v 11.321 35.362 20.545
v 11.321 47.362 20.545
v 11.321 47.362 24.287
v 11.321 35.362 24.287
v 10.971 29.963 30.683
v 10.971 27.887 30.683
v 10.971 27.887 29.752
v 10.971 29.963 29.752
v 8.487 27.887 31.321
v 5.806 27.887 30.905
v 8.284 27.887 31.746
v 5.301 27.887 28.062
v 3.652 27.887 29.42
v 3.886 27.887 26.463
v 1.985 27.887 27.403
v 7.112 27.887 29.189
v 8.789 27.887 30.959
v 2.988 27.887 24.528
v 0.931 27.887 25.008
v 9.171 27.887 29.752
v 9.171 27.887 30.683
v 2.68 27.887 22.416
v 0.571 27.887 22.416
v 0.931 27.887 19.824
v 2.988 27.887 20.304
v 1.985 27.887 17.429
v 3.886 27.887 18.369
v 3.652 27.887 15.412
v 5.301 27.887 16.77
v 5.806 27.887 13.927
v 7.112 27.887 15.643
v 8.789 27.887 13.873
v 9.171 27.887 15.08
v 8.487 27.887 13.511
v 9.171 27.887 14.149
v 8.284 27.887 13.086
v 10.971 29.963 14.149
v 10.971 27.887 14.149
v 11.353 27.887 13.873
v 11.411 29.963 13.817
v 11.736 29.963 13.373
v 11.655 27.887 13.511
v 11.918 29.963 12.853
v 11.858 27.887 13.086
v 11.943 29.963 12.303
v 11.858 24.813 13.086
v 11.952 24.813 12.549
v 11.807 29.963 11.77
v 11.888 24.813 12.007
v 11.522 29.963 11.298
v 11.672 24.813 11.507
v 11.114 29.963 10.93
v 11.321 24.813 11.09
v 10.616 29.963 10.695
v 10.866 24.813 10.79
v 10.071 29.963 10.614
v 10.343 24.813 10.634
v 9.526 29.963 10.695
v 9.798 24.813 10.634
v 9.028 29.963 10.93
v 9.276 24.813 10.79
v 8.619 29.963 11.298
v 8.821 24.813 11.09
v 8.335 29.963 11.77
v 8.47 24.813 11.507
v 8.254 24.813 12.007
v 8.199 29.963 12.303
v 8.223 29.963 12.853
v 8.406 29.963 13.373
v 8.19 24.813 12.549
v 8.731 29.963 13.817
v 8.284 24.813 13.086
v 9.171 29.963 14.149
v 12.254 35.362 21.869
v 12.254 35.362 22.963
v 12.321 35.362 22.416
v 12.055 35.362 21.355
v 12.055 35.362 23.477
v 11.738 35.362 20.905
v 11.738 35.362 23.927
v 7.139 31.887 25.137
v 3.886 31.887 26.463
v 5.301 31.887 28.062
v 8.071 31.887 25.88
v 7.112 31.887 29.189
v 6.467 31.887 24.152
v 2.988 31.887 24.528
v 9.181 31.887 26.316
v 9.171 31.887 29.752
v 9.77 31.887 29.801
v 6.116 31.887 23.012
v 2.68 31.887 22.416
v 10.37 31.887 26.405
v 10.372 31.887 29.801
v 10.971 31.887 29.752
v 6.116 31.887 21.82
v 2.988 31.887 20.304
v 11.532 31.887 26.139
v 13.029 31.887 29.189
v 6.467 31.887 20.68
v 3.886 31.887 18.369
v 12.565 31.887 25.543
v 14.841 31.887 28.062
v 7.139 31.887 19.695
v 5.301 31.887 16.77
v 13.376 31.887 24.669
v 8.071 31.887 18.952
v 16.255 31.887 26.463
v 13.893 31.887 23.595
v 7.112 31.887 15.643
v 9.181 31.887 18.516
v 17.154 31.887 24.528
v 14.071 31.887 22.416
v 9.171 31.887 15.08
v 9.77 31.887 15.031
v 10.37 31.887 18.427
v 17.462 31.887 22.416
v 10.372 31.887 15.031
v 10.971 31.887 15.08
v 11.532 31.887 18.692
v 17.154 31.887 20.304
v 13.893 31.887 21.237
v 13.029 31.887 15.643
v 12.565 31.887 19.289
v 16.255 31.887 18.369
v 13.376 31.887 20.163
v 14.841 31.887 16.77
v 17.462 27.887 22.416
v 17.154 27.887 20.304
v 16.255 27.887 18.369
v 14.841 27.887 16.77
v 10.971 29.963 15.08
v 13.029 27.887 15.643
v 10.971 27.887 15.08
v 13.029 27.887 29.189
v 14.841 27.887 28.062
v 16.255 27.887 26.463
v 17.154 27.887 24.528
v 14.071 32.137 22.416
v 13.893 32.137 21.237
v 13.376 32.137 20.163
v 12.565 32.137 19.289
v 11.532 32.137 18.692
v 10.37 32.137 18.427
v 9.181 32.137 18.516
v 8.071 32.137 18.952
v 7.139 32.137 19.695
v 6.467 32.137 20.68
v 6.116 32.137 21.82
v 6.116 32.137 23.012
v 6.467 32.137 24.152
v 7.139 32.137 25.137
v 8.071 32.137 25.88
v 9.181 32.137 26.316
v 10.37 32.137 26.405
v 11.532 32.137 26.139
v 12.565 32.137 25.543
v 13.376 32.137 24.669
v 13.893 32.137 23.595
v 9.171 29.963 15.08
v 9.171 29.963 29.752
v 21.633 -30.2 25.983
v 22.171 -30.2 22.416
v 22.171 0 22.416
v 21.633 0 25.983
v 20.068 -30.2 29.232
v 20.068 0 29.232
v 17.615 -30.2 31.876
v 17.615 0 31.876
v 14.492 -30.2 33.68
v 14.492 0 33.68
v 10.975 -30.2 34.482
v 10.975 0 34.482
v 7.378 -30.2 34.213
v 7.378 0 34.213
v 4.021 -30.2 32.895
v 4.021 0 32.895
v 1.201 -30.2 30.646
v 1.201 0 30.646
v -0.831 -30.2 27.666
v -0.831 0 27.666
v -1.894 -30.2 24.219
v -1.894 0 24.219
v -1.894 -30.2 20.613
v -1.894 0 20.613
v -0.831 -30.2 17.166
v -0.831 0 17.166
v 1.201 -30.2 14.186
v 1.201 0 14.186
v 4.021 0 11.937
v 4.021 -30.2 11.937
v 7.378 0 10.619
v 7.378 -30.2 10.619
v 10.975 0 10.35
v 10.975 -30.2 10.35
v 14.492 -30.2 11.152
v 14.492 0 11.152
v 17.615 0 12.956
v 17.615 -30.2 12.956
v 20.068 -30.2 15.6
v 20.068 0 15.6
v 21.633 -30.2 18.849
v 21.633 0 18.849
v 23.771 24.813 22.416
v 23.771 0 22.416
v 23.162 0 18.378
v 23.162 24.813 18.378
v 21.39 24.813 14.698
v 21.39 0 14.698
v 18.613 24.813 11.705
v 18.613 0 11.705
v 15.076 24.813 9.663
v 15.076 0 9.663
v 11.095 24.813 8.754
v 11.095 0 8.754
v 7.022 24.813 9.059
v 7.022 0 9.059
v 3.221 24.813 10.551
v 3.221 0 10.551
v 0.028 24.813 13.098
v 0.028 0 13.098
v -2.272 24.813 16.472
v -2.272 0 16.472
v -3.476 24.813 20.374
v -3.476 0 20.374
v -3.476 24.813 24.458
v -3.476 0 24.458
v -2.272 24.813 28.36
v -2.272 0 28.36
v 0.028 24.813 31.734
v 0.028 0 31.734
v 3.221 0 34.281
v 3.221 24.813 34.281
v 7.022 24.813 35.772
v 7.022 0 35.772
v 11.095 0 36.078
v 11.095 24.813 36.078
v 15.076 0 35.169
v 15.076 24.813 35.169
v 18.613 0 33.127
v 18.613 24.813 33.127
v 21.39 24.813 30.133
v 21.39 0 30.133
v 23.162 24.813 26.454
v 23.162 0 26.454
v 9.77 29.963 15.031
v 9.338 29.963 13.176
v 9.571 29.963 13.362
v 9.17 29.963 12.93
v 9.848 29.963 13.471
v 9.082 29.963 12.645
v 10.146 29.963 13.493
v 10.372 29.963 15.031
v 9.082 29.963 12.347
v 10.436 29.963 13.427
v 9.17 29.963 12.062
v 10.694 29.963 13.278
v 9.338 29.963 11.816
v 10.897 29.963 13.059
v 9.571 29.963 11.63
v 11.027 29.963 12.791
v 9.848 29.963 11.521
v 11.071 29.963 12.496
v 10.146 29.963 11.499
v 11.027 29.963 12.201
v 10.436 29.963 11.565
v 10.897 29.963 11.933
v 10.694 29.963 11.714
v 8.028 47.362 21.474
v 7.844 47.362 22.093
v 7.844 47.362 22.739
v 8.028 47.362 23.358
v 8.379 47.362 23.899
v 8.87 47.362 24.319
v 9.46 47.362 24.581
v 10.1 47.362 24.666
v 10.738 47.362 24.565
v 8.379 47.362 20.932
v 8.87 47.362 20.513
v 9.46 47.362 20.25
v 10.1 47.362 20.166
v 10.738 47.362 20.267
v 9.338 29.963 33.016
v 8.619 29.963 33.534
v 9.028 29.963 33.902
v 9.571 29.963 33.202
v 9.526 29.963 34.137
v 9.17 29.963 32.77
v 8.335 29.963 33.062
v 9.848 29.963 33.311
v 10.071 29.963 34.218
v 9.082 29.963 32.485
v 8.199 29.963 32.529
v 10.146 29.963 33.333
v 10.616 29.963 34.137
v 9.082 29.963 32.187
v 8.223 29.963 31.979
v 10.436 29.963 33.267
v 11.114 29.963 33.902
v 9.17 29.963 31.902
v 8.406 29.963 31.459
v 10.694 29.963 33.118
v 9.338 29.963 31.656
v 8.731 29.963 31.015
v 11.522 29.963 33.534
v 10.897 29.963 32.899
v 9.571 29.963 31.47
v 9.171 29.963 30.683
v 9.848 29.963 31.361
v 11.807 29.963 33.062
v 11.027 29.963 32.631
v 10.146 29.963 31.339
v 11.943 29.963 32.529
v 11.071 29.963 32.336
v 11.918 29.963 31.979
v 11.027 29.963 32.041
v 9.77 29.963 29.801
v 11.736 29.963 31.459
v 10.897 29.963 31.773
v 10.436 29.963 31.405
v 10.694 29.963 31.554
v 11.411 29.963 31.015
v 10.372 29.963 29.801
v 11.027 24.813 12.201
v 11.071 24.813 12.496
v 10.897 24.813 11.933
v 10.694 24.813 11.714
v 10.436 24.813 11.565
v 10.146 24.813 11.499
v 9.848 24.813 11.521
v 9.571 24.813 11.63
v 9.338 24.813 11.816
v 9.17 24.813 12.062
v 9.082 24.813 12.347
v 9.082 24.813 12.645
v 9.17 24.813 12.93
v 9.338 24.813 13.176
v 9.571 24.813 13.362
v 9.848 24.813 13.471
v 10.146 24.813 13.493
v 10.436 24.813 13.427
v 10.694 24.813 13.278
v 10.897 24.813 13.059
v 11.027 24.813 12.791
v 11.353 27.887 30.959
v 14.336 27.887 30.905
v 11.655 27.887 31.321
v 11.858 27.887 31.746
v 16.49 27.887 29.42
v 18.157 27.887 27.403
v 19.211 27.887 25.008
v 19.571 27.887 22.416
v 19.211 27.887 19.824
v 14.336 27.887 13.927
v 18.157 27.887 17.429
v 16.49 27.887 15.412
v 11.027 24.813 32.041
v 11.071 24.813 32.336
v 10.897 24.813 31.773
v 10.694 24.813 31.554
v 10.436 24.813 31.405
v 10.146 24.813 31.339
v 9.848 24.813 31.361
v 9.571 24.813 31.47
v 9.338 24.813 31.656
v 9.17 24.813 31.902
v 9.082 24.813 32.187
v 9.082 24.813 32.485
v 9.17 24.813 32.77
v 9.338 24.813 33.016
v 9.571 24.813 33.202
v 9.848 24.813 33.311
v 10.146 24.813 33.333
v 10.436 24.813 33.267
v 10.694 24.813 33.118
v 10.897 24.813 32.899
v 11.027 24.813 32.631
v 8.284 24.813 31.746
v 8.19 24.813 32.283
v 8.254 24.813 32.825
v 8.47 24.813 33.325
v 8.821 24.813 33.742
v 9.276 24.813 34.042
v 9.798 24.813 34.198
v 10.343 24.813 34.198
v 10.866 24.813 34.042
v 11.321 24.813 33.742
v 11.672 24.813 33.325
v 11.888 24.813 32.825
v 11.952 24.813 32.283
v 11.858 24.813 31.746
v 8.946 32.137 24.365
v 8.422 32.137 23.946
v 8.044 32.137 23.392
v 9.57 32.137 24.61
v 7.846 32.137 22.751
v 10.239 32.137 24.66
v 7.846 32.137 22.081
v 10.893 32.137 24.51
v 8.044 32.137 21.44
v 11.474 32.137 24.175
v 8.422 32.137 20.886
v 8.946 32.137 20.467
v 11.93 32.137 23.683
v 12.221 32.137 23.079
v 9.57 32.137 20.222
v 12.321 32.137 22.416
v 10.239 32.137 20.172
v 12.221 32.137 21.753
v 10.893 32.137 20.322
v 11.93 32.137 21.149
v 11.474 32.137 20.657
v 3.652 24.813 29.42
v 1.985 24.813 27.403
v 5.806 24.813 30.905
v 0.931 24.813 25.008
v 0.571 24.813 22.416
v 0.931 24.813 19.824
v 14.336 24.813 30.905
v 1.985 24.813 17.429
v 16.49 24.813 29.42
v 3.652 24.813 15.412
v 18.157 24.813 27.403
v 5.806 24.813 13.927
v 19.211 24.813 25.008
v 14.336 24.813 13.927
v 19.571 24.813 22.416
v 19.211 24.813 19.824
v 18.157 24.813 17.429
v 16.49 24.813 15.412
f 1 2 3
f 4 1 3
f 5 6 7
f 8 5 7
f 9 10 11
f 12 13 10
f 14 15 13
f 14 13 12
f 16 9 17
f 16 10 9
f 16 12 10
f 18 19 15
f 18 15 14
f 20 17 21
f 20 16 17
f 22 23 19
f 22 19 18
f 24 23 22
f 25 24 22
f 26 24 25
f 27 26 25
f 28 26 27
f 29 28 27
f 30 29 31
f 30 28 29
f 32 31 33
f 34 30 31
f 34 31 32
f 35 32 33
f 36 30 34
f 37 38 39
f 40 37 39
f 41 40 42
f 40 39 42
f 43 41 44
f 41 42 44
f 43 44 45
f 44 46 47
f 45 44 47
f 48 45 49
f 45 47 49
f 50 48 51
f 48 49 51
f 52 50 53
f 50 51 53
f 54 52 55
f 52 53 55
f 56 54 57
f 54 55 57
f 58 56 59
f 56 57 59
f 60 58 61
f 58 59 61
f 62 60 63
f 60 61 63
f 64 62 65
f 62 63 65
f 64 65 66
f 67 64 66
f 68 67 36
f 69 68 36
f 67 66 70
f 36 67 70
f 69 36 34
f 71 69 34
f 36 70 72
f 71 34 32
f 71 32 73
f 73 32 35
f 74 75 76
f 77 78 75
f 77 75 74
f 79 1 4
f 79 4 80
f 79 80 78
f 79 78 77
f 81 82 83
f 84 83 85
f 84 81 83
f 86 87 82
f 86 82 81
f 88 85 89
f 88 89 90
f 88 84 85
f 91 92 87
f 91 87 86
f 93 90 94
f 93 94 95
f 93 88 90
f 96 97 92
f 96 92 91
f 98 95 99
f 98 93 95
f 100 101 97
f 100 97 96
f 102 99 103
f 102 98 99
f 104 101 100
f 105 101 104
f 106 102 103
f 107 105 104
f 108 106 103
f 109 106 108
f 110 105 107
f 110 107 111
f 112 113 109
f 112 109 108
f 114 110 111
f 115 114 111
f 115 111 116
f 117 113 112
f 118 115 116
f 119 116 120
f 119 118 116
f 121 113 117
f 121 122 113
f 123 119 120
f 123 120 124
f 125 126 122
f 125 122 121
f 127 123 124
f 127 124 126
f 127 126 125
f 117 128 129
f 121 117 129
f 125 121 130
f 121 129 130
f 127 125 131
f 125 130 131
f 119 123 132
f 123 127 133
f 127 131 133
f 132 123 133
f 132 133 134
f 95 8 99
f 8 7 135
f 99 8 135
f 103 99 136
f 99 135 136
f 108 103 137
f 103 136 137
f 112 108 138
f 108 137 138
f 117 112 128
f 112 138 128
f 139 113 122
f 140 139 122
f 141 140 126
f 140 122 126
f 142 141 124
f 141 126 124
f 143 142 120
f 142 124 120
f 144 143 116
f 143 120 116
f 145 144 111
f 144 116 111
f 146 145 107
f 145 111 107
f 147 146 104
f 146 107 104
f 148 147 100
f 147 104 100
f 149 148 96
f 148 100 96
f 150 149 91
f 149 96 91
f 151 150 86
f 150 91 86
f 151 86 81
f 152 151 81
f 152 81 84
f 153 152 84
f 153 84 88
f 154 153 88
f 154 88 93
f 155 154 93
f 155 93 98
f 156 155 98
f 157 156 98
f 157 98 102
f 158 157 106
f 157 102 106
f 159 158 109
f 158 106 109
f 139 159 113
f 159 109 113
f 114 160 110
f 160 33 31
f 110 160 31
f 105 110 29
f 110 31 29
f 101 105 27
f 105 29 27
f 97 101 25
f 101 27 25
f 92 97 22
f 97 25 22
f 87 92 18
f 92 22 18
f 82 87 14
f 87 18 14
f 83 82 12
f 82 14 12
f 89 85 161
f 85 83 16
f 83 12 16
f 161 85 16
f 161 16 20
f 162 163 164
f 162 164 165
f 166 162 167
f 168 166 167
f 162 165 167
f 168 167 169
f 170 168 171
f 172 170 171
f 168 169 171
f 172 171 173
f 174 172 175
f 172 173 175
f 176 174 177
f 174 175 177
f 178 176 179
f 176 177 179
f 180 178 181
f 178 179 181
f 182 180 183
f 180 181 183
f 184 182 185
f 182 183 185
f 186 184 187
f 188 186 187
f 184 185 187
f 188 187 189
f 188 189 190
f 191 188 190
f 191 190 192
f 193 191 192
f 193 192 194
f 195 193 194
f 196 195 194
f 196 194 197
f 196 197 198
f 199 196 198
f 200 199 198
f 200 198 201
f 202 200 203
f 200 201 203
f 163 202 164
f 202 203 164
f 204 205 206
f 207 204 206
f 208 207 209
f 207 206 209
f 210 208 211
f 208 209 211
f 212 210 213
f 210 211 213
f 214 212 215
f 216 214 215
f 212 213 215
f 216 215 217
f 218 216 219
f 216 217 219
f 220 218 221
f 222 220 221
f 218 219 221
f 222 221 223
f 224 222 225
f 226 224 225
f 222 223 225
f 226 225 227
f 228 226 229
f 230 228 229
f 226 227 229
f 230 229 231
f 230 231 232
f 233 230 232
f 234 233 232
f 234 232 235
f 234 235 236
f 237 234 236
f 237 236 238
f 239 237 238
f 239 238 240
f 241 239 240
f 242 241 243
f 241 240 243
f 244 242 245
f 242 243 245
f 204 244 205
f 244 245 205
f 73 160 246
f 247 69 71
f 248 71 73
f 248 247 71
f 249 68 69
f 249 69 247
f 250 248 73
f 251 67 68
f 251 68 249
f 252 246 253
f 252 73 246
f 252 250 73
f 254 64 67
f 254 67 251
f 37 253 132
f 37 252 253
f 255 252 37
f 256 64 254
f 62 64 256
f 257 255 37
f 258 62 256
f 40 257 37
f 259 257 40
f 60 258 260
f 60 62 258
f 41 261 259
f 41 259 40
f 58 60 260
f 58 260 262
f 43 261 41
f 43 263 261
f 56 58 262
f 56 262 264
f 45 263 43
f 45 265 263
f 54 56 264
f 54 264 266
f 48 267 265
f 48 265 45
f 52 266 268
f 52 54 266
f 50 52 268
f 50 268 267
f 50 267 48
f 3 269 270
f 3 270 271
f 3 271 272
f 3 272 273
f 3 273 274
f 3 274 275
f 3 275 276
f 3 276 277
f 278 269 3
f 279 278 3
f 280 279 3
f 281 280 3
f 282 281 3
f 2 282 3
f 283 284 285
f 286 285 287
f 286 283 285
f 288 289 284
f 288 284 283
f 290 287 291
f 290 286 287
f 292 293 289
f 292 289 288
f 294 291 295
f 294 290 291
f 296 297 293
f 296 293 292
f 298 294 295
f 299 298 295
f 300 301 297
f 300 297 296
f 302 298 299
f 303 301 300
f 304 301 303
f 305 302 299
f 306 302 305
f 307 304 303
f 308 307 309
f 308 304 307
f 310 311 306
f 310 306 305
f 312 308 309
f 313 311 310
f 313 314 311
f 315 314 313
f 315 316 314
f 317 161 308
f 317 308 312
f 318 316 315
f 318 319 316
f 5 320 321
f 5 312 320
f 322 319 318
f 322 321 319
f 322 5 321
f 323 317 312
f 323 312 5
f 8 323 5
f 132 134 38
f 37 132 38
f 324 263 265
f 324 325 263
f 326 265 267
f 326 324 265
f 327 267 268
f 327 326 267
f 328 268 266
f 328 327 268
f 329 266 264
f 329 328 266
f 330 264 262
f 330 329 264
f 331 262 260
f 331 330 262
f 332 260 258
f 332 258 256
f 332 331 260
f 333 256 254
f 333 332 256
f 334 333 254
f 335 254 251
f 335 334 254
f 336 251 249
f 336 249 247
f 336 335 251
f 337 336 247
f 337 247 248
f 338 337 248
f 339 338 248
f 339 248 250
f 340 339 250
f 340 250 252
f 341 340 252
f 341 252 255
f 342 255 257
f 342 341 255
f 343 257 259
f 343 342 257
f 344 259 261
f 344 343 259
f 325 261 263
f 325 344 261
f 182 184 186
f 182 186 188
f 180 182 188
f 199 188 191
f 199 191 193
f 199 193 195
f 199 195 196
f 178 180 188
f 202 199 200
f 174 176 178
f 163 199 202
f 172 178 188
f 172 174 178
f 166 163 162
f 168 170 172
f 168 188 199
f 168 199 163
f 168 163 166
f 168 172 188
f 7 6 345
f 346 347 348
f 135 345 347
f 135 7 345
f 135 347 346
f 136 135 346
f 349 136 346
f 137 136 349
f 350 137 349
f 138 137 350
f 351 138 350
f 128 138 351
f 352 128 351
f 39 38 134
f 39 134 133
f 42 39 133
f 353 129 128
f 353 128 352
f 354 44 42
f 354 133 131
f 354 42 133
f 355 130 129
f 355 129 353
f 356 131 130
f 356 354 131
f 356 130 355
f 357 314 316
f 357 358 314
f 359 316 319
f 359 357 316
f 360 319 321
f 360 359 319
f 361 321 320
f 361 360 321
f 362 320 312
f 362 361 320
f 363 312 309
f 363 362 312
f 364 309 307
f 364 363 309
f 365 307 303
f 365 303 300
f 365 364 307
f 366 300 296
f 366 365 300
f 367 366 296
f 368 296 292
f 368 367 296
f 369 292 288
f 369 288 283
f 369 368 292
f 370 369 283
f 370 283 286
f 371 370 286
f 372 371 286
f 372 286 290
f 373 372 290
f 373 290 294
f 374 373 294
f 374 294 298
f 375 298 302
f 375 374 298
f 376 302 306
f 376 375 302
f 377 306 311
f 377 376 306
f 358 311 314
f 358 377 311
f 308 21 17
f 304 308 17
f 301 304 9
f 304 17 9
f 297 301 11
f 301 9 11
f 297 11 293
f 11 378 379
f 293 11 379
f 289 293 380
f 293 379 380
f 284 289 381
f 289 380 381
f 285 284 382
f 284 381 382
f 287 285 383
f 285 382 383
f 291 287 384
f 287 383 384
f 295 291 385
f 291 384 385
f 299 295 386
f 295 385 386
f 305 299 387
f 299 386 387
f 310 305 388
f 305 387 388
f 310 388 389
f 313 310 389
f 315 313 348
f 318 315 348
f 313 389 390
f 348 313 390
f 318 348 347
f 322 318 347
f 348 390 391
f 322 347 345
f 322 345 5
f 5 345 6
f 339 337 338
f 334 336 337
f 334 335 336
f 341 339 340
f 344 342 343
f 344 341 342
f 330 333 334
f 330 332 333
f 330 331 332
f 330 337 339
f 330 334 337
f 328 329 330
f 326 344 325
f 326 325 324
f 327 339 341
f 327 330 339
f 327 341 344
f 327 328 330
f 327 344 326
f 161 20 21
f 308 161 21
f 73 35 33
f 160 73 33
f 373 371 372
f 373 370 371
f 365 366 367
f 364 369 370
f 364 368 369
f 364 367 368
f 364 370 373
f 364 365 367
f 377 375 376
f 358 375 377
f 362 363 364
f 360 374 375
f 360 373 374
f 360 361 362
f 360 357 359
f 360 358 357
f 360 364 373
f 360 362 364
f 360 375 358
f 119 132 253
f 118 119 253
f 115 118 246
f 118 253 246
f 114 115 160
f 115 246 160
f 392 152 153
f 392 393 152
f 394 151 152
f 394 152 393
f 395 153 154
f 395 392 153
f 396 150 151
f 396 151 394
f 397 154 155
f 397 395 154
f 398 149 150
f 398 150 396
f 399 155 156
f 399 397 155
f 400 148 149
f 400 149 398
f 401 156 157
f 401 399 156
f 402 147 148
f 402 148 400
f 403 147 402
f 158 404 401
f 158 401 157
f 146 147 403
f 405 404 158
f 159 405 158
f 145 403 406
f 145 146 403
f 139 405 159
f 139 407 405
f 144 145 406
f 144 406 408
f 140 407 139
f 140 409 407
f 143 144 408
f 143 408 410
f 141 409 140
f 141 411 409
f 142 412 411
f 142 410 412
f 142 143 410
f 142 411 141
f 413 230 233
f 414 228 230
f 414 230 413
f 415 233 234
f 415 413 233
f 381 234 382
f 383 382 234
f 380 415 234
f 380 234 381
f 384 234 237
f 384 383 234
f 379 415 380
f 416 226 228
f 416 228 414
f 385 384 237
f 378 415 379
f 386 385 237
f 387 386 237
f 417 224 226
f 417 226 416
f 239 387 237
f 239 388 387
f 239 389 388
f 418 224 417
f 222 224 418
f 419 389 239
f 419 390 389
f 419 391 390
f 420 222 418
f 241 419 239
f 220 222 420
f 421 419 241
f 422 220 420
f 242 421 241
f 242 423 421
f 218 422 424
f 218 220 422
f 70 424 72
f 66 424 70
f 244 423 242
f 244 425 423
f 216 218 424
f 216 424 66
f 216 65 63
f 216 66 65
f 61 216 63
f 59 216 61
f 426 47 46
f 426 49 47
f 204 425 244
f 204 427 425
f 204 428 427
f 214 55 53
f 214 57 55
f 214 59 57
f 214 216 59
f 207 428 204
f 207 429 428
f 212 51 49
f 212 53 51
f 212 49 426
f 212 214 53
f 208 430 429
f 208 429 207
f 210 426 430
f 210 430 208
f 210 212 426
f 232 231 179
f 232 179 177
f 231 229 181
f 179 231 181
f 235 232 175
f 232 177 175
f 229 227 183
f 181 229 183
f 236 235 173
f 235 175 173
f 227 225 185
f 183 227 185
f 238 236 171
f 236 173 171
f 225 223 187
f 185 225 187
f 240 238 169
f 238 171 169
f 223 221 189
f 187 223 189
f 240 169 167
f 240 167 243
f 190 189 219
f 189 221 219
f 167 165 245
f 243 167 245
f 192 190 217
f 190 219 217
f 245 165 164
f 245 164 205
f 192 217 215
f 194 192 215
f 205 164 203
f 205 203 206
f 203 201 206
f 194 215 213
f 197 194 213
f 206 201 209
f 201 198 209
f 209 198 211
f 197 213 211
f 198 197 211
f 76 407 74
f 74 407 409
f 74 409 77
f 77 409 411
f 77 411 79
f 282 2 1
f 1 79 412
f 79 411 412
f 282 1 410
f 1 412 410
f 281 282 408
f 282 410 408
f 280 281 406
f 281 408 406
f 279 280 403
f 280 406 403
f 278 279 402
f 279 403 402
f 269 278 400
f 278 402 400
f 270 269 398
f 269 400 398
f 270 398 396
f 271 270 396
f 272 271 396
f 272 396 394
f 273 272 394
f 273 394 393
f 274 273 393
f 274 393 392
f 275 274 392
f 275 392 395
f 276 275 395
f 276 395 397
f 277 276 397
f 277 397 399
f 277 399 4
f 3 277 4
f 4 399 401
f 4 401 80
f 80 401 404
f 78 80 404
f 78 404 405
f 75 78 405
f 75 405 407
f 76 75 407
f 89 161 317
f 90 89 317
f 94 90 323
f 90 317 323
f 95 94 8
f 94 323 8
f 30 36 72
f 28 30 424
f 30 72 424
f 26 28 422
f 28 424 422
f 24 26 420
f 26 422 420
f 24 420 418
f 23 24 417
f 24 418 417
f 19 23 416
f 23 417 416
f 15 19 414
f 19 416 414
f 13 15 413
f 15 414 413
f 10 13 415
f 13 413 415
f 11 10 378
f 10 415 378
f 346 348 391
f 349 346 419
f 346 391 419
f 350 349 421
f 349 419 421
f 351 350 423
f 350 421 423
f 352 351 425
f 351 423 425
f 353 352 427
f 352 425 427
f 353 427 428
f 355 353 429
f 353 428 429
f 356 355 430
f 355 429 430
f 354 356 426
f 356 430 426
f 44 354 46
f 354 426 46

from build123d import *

# Parameters (mm, degrees)
FRONT_CYLINDER_SKETCH_R    = 13.7
FRONT_CYLINDER_DEPTH       = 24.81270946
MOUNTING_POINT_SKETCH_R    = 1
MOUNTING_POINTS_DEPTH      = 5.15
GEAR_MOUNT_BOTTOM_SKETCH_R = 9.5
GEAR_MOUNT_BOTTOM_DEPTH    = 3.074685726
GEAR_MOUNT_TOP_DEPTH       = 4
MOUNTING_HOLES_REACH       = 9.075
MOUNTING_HOLES_SKETCH_R    = 1
GEAR_DISK_SKETCH_R         = 4
GEAR_DISK_DEPTH            = 0.25
GEAR_SKETCH_R              = 2.25
GEAR_DEPTH                 = 15.225
GEAR_NOTCH_DEPTH           = 12
BACK_CYLINDER_SKETCH_R     = 12.1
BOSS_EXTRUDE7_DEPTH        = 30.2


with BuildPart() as part:
    # Front cylinder sketch → Front Cylinder (new body)
    with BuildSketch(Plane(origin=(0, 0, 0), x_dir=(1, 0, 0), z_dir=(0, 1, 0))):
        with Locations((10.070944868, -22.415974061)):
            Circle(FRONT_CYLINDER_SKETCH_R)
    extrude(amount=FRONT_CYLINDER_DEPTH)

    # Mounting Point Sketch → Mounting Points (add)
    with BuildSketch(Plane(origin=(0, 24.81270946, 0), x_dir=(1, 0, 0), z_dir=(0, 1, 0))):
        with BuildLine():
            Line((10.970944868, -15.079824378), (10.970944868, -14.148518185))
            ThreePointArc((10.970944868, -14.148518185), (10.070944868, -10.614245578), (9.170944868, -14.148518185))
            Line((9.170944868, -14.148518185), (9.170944868, -15.079824378))
            ThreePointArc((9.170944868, -15.079824378), (10.070944868, -15.024824478), (10.970944868, -15.079824378))
        make_face()
        with Locations((10.070944868, -12.495974061)):
            Circle(MOUNTING_POINT_SKETCH_R, mode=Mode.SUBTRACT)
        with BuildLine():
            Line((9.170944868, -29.752123743), (9.170944868, -30.683429936))
            ThreePointArc((9.170944868, -30.683429936), (10.070944868, -34.217702543), (10.970944868, -30.683429936))
            Line((10.970944868, -30.683429936), (10.970944868, -29.752123743))
            ThreePointArc((10.970944868, -29.752123743), (10.070944868, -29.807123644), (9.170944868, -29.752123743))
        make_face()
        with Locations((10.070944868, -32.335974061)):
            Circle(MOUNTING_POINT_SKETCH_R, mode=Mode.SUBTRACT)
    extrude(amount=MOUNTING_POINTS_DEPTH)

    # Gear Mount Bottom Sketch → Gear Mount Bottom (add)
    with BuildSketch(Plane(origin=(0, 24.81270946, 0), x_dir=(1, 0, 0), z_dir=(0, 1, 0))):
        with Locations((10.070944868, -22.415974061)):
            Circle(GEAR_MOUNT_BOTTOM_SKETCH_R)
    extrude(amount=GEAR_MOUNT_BOTTOM_DEPTH)

    # Gear Mount Top Sketch → Gear Mount Top (add)
    with BuildSketch(Plane(origin=(0, 27.887395186, 0), x_dir=(1, 0, 0), z_dir=(0, 1, 0))):
        with BuildLine():
            ThreePointArc((17.462094451, -22.415974061), (15.606336759, -17.518165493), (10.970944868, -15.079824378))
            ThreePointArc((10.970944868, -15.079824378), (10.070944868, -15.024824478), (9.170944868, -15.079824378))
            ThreePointArc((9.170944868, -15.079824378), (2.679795285, -22.415974061), (9.170944868, -29.752123743))
            ThreePointArc((9.170944868, -29.752123743), (10.070944868, -29.807123644), (10.970944868, -29.752123743))
            ThreePointArc((10.970944868, -29.752123743), (15.606336759, -27.313782629), (17.462094451, -22.415974061))
        make_face()
    extrude(amount=GEAR_MOUNT_TOP_DEPTH)

    # Mounting Holes Sketch → Mounting Holes (cut, up to next)
    with BuildSketch(Plane(origin=(0, 24.81270946, 0), x_dir=(1, 0, 0), z_dir=(0, 1, 0)), mode=Mode.PRIVATE) as mounting_holes_sk1:
        with Locations((10.070944868, -12.495974061)):
            Circle(MOUNTING_HOLES_SKETCH_R)
    mounting_holes_tool1 = extrude(mounting_holes_sk1.sketch, amount=MOUNTING_HOLES_REACH, mode=Mode.PRIVATE) & part.part
    add(mounting_holes_tool1.solids().sort_by_distance((10.070945, 24.812709, 12.495974))[0], mode=Mode.SUBTRACT)
    # Mounting Holes Sketch → Mounting Holes (cut, up to next)
    with BuildSketch(Plane(origin=(0, 24.81270946, 0), x_dir=(1, 0, 0), z_dir=(0, 1, 0)), mode=Mode.PRIVATE) as mounting_holes_sk2:
        with Locations((10.070944868, -32.335974061)):
            Circle(MOUNTING_HOLES_SKETCH_R)
    mounting_holes_tool2 = extrude(mounting_holes_sk2.sketch, amount=MOUNTING_HOLES_REACH, mode=Mode.PRIVATE) & part.part
    add(mounting_holes_tool2.solids().sort_by_distance((10.070945, 24.812709, 32.335974))[0], mode=Mode.SUBTRACT)

    # Gear Disk Sketch → Gear disk (add)
    with BuildSketch(Plane(origin=(0, 31.887395186, 0), x_dir=(1, 0, 0), z_dir=(0, 1, 0))):
        with Locations((10.070944868, -22.415974061)):
            Circle(GEAR_DISK_SKETCH_R)
    extrude(amount=GEAR_DISK_DEPTH)

    # Gear Sketch → Gear (add)
    with BuildSketch(Plane(origin=(0, 32.137395186, 0), x_dir=(1, 0, 0), z_dir=(0, 1, 0))):
        with Locations((10.070944868, -22.415974061)):
            Circle(GEAR_SKETCH_R)
    extrude(amount=GEAR_DEPTH)

    # Gear Notch Sketch → Gear Notch (cut)
    with BuildSketch(Plane(origin=(0, 47.362395186, 0), x_dir=(1, 0, 0), z_dir=(0, 1, 0))):
        with BuildLine():
            ThreePointArc((12.320944868, -22.415974061), (12.055258351, -21.355313889), (11.320944868, -20.545145367))
            Line((11.320944868, -20.545145367), (11.320944868, -24.286802754))
            ThreePointArc((11.320944868, -24.286802754), (12.055258351, -23.476634232), (12.320944868, -22.415974061))
        make_face()
    extrude(amount=-GEAR_NOTCH_DEPTH, mode=Mode.SUBTRACT)

    # Back Cylinder Sketch → Boss-Extrude7 (add)
    with BuildSketch(Plane.XZ):
        with Locations((10.070944868, 22.415974061)):
            Circle(BACK_CYLINDER_SKETCH_R)
    extrude(amount=BOSS_EXTRUDE7_DEPTH)


solid = part.part
